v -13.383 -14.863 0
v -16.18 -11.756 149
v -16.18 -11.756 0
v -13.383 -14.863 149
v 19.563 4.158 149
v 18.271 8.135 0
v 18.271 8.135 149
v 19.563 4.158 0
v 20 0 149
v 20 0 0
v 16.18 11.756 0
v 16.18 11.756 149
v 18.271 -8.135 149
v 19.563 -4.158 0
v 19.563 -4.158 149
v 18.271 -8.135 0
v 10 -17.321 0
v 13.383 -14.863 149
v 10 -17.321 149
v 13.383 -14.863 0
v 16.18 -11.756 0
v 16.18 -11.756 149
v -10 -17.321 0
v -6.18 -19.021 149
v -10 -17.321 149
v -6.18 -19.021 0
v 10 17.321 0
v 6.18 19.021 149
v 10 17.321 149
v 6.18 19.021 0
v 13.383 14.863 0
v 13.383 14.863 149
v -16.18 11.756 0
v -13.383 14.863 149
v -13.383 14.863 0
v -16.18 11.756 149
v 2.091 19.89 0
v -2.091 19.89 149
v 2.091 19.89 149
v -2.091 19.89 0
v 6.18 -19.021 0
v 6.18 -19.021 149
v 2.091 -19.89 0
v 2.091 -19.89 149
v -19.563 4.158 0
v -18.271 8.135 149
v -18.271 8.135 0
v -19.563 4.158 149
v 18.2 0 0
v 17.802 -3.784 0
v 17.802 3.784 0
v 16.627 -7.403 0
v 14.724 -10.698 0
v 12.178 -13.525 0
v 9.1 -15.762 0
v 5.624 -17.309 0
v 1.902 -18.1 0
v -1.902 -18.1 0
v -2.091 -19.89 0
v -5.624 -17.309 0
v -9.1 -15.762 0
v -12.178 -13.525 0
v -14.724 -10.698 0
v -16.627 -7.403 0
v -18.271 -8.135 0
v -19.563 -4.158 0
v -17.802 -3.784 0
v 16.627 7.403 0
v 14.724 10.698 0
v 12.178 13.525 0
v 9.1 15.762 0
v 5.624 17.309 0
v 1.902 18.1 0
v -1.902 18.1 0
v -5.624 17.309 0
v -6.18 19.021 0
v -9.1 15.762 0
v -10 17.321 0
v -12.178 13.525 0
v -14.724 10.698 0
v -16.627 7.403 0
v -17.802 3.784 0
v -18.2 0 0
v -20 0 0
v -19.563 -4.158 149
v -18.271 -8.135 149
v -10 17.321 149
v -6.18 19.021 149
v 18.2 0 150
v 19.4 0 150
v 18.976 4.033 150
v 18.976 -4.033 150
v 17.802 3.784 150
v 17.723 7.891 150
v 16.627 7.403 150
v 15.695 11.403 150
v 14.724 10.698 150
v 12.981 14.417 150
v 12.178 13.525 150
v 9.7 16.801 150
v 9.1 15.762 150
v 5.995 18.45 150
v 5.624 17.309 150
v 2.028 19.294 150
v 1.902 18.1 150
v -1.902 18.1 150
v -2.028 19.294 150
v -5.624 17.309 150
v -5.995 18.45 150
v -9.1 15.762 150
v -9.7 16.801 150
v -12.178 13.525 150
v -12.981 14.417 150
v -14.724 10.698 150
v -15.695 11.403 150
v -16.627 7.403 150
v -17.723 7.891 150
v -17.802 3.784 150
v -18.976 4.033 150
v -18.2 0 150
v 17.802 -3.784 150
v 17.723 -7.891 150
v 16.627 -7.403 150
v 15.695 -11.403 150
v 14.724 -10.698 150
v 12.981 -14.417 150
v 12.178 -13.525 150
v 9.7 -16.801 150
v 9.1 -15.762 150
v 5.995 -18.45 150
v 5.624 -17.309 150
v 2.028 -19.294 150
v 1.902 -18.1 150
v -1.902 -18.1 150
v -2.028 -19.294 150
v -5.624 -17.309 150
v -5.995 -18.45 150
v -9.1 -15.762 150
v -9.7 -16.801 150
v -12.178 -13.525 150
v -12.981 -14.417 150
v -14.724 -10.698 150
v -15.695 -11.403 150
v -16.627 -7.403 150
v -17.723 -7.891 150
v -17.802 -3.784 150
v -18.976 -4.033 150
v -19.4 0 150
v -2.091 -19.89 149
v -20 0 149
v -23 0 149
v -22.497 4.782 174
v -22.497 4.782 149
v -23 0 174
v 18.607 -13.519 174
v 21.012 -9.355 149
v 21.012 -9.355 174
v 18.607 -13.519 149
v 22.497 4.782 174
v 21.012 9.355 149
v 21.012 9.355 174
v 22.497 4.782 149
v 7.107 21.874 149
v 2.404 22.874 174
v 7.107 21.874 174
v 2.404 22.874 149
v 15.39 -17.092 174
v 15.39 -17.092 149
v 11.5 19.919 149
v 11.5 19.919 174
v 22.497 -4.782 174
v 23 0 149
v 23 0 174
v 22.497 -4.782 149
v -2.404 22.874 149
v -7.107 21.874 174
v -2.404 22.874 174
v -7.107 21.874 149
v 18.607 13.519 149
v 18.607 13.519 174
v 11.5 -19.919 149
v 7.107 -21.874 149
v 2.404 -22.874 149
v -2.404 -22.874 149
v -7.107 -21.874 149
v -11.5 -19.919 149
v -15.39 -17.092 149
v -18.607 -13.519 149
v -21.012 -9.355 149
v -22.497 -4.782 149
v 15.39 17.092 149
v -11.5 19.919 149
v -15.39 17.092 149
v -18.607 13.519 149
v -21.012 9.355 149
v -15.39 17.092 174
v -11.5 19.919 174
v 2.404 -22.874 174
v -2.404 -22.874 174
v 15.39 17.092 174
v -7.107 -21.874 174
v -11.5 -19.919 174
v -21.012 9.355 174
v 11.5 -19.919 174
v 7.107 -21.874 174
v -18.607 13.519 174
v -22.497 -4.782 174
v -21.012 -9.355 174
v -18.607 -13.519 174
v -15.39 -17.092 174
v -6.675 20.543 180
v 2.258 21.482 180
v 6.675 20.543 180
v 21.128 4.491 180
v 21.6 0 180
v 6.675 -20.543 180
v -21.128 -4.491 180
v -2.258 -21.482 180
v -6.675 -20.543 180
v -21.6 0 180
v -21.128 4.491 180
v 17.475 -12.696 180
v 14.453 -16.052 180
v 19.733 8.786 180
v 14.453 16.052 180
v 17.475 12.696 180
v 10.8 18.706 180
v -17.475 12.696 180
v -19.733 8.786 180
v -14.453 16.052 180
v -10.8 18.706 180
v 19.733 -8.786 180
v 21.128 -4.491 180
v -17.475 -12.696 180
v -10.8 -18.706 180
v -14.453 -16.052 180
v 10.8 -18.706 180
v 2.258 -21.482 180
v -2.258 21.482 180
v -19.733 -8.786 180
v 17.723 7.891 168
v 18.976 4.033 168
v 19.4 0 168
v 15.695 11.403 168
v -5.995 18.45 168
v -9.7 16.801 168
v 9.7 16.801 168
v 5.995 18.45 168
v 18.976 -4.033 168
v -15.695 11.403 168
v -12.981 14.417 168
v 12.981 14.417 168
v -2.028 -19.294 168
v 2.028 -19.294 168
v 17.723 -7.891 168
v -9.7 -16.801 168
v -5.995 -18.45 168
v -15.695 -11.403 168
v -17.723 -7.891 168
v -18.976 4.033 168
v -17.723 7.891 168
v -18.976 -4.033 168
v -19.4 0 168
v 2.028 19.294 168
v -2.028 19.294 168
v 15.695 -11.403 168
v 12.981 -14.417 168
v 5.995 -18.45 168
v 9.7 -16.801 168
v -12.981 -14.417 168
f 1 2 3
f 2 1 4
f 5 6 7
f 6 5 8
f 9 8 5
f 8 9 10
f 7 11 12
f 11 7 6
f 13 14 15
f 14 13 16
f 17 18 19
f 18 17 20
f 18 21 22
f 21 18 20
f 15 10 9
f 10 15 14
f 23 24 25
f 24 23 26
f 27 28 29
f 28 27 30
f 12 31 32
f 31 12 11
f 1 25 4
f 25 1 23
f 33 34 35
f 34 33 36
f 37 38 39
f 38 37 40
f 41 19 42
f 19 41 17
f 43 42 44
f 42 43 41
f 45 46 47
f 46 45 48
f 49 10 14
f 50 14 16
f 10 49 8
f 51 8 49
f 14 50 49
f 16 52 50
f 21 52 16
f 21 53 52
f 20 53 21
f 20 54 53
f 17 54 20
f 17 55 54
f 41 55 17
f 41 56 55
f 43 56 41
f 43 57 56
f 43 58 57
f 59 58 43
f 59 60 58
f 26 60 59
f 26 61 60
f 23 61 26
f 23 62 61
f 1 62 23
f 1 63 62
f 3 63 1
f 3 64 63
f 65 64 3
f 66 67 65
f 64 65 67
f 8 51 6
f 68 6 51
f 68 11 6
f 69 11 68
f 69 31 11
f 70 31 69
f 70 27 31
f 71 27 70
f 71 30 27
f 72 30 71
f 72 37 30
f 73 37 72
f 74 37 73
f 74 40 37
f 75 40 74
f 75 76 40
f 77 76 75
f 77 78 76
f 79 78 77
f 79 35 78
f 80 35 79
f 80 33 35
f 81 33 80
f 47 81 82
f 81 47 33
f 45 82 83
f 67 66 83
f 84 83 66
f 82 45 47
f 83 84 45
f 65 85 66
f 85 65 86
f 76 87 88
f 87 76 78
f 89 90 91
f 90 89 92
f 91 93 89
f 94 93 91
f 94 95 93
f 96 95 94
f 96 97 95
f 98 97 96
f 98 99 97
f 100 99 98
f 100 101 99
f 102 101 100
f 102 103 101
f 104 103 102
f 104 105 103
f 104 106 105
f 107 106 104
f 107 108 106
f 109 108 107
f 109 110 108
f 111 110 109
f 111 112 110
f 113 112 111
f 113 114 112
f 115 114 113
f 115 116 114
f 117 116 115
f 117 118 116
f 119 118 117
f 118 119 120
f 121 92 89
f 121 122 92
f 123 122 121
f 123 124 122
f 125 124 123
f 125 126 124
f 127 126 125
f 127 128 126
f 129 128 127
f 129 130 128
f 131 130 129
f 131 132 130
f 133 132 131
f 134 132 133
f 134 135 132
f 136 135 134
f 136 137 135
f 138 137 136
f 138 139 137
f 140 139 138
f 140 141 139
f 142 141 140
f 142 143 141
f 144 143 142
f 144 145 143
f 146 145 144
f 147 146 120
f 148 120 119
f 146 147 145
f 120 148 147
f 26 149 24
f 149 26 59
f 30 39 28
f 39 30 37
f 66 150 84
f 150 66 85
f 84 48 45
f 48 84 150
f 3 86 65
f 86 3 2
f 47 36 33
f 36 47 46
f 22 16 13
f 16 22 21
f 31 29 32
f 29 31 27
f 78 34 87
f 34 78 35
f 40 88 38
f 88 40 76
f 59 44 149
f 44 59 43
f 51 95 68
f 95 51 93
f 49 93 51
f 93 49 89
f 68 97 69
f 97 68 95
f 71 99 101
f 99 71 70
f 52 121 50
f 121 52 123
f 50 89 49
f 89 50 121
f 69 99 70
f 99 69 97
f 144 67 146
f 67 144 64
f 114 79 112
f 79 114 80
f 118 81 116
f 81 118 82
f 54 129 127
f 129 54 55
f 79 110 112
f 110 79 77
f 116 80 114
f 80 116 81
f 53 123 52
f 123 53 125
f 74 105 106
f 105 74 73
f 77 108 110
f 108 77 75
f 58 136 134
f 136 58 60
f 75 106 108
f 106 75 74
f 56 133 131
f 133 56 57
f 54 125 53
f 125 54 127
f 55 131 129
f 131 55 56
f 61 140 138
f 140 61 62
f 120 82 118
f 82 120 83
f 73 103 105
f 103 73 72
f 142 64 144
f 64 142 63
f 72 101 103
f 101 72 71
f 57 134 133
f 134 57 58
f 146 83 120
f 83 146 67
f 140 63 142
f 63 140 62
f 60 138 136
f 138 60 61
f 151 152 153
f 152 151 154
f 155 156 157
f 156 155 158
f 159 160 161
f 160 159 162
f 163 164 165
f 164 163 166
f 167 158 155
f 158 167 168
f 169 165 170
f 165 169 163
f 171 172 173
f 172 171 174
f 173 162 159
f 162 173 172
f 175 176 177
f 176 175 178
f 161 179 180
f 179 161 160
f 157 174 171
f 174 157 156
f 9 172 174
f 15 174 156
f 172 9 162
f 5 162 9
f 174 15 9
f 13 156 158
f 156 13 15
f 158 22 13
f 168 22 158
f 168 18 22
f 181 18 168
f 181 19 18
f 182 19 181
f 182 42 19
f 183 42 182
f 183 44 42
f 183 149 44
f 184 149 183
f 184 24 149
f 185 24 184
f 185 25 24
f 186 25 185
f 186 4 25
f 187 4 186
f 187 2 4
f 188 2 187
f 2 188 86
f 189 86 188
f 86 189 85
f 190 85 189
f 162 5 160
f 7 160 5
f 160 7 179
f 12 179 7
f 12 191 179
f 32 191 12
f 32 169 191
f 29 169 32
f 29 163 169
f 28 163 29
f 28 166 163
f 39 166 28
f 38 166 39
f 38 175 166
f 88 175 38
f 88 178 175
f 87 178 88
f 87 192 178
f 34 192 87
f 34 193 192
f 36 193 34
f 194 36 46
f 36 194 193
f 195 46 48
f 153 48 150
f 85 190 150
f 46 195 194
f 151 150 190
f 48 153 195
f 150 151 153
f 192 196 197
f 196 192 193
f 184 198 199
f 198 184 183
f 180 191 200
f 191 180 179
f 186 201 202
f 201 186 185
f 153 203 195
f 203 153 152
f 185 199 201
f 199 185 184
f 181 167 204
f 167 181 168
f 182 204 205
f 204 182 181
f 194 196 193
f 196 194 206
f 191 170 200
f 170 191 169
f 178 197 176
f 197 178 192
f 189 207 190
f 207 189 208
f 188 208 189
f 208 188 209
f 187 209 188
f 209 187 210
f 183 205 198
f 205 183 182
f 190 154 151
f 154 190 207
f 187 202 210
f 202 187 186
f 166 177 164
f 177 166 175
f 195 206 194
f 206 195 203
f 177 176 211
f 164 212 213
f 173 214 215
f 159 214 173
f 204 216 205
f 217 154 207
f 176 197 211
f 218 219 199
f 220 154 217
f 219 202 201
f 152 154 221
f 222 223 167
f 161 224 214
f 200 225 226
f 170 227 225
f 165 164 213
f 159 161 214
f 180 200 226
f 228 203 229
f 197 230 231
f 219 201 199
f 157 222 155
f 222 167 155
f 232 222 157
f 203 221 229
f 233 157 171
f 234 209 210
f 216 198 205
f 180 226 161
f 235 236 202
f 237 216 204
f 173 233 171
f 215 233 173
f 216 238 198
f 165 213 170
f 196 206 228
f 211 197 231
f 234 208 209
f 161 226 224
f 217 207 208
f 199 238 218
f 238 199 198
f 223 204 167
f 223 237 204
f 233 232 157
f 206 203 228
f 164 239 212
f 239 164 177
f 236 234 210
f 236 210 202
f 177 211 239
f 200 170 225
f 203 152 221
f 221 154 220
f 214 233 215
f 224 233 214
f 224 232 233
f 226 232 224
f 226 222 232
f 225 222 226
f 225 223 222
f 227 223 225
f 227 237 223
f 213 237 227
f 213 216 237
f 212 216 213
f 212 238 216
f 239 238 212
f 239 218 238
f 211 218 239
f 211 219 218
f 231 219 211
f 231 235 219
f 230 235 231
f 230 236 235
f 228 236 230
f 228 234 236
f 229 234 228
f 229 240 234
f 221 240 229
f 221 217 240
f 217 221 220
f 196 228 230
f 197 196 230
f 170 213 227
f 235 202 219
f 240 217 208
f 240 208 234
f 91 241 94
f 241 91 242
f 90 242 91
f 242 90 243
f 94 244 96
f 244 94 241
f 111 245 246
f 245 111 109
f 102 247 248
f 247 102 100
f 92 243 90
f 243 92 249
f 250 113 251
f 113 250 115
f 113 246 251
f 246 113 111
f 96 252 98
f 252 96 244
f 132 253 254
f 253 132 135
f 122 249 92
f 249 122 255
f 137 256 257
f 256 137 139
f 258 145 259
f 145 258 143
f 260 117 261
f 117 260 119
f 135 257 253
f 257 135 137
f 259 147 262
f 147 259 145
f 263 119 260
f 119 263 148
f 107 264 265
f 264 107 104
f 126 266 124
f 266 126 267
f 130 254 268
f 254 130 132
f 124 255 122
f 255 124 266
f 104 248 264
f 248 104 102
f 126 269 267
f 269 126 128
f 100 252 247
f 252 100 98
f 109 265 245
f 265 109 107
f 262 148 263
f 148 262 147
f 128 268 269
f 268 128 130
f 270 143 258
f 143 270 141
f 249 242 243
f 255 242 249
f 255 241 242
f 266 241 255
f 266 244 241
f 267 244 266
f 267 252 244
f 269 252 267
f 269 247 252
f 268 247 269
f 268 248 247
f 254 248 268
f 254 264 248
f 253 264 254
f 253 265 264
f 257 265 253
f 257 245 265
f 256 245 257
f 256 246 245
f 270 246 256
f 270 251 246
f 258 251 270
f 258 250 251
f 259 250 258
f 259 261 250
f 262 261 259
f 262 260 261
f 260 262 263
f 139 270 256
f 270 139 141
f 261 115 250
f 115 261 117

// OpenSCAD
// Parameters
pipe_standard = 1; //[1:1:1]
nominal_size = 40; //[20:80:1]
length_mm = 150; //[75:300:1]
pipe_od = 40; //[20:80:0.5]
pipe_wall = 1.8; //[0.9:3.6:0.1]
overlap = 1; //[0.5:2:0.1]
fitting_length = 25; //[12.5:50:0.5]
fitting_od_scale = 1.15; //[1.05:1.35:0.01]
socket_wall_extra = 1.2; //[0.6:2.4:0.1]
socket_depth = 18; //[9:36:0.5]
lead_in_length = 6; //[3:12:0.5]
lead_in_od_scale = 1.08; //[1.02:1.2:0.01]

// Module for the HT Pipe
module ht_pipe() {
  color([0.85, 0.85, 0.8]) {
    // Hollow tube body
    difference() {
      cylinder(h=length_mm, r=pipe_od/2, center=false);
      translate([0, 0, -overlap])
        cylinder(h=length_mm + overlap*2, r=pipe_od/2 - pipe_wall, center=false);
    }
    
    // End fitting
    translate([0, 0, length_mm - overlap]) {
      difference() {
        union() {
          // Main outer fitting
          cylinder(h=fitting_length, r=(pipe_od*fitting_od_scale)/2, center=false);
          // Lead-in section
          translate([0, 0, fitting_length])
            cylinder(h=lead_in_length, r1=(pipe_od*fitting_od_scale)/2, r2=(pipe_od*lead_in_od_scale)/2, center=false);
        }
        // Socket void
        translate([0, 0, 0])
          cylinder(h=socket_depth + overlap, r=pipe_od/2 + socket_wall_extra - pipe_wall, center=false);
      }
    }
  }
}

// Assembly
module assembly() {
  ht_pipe();
}

assembly();
